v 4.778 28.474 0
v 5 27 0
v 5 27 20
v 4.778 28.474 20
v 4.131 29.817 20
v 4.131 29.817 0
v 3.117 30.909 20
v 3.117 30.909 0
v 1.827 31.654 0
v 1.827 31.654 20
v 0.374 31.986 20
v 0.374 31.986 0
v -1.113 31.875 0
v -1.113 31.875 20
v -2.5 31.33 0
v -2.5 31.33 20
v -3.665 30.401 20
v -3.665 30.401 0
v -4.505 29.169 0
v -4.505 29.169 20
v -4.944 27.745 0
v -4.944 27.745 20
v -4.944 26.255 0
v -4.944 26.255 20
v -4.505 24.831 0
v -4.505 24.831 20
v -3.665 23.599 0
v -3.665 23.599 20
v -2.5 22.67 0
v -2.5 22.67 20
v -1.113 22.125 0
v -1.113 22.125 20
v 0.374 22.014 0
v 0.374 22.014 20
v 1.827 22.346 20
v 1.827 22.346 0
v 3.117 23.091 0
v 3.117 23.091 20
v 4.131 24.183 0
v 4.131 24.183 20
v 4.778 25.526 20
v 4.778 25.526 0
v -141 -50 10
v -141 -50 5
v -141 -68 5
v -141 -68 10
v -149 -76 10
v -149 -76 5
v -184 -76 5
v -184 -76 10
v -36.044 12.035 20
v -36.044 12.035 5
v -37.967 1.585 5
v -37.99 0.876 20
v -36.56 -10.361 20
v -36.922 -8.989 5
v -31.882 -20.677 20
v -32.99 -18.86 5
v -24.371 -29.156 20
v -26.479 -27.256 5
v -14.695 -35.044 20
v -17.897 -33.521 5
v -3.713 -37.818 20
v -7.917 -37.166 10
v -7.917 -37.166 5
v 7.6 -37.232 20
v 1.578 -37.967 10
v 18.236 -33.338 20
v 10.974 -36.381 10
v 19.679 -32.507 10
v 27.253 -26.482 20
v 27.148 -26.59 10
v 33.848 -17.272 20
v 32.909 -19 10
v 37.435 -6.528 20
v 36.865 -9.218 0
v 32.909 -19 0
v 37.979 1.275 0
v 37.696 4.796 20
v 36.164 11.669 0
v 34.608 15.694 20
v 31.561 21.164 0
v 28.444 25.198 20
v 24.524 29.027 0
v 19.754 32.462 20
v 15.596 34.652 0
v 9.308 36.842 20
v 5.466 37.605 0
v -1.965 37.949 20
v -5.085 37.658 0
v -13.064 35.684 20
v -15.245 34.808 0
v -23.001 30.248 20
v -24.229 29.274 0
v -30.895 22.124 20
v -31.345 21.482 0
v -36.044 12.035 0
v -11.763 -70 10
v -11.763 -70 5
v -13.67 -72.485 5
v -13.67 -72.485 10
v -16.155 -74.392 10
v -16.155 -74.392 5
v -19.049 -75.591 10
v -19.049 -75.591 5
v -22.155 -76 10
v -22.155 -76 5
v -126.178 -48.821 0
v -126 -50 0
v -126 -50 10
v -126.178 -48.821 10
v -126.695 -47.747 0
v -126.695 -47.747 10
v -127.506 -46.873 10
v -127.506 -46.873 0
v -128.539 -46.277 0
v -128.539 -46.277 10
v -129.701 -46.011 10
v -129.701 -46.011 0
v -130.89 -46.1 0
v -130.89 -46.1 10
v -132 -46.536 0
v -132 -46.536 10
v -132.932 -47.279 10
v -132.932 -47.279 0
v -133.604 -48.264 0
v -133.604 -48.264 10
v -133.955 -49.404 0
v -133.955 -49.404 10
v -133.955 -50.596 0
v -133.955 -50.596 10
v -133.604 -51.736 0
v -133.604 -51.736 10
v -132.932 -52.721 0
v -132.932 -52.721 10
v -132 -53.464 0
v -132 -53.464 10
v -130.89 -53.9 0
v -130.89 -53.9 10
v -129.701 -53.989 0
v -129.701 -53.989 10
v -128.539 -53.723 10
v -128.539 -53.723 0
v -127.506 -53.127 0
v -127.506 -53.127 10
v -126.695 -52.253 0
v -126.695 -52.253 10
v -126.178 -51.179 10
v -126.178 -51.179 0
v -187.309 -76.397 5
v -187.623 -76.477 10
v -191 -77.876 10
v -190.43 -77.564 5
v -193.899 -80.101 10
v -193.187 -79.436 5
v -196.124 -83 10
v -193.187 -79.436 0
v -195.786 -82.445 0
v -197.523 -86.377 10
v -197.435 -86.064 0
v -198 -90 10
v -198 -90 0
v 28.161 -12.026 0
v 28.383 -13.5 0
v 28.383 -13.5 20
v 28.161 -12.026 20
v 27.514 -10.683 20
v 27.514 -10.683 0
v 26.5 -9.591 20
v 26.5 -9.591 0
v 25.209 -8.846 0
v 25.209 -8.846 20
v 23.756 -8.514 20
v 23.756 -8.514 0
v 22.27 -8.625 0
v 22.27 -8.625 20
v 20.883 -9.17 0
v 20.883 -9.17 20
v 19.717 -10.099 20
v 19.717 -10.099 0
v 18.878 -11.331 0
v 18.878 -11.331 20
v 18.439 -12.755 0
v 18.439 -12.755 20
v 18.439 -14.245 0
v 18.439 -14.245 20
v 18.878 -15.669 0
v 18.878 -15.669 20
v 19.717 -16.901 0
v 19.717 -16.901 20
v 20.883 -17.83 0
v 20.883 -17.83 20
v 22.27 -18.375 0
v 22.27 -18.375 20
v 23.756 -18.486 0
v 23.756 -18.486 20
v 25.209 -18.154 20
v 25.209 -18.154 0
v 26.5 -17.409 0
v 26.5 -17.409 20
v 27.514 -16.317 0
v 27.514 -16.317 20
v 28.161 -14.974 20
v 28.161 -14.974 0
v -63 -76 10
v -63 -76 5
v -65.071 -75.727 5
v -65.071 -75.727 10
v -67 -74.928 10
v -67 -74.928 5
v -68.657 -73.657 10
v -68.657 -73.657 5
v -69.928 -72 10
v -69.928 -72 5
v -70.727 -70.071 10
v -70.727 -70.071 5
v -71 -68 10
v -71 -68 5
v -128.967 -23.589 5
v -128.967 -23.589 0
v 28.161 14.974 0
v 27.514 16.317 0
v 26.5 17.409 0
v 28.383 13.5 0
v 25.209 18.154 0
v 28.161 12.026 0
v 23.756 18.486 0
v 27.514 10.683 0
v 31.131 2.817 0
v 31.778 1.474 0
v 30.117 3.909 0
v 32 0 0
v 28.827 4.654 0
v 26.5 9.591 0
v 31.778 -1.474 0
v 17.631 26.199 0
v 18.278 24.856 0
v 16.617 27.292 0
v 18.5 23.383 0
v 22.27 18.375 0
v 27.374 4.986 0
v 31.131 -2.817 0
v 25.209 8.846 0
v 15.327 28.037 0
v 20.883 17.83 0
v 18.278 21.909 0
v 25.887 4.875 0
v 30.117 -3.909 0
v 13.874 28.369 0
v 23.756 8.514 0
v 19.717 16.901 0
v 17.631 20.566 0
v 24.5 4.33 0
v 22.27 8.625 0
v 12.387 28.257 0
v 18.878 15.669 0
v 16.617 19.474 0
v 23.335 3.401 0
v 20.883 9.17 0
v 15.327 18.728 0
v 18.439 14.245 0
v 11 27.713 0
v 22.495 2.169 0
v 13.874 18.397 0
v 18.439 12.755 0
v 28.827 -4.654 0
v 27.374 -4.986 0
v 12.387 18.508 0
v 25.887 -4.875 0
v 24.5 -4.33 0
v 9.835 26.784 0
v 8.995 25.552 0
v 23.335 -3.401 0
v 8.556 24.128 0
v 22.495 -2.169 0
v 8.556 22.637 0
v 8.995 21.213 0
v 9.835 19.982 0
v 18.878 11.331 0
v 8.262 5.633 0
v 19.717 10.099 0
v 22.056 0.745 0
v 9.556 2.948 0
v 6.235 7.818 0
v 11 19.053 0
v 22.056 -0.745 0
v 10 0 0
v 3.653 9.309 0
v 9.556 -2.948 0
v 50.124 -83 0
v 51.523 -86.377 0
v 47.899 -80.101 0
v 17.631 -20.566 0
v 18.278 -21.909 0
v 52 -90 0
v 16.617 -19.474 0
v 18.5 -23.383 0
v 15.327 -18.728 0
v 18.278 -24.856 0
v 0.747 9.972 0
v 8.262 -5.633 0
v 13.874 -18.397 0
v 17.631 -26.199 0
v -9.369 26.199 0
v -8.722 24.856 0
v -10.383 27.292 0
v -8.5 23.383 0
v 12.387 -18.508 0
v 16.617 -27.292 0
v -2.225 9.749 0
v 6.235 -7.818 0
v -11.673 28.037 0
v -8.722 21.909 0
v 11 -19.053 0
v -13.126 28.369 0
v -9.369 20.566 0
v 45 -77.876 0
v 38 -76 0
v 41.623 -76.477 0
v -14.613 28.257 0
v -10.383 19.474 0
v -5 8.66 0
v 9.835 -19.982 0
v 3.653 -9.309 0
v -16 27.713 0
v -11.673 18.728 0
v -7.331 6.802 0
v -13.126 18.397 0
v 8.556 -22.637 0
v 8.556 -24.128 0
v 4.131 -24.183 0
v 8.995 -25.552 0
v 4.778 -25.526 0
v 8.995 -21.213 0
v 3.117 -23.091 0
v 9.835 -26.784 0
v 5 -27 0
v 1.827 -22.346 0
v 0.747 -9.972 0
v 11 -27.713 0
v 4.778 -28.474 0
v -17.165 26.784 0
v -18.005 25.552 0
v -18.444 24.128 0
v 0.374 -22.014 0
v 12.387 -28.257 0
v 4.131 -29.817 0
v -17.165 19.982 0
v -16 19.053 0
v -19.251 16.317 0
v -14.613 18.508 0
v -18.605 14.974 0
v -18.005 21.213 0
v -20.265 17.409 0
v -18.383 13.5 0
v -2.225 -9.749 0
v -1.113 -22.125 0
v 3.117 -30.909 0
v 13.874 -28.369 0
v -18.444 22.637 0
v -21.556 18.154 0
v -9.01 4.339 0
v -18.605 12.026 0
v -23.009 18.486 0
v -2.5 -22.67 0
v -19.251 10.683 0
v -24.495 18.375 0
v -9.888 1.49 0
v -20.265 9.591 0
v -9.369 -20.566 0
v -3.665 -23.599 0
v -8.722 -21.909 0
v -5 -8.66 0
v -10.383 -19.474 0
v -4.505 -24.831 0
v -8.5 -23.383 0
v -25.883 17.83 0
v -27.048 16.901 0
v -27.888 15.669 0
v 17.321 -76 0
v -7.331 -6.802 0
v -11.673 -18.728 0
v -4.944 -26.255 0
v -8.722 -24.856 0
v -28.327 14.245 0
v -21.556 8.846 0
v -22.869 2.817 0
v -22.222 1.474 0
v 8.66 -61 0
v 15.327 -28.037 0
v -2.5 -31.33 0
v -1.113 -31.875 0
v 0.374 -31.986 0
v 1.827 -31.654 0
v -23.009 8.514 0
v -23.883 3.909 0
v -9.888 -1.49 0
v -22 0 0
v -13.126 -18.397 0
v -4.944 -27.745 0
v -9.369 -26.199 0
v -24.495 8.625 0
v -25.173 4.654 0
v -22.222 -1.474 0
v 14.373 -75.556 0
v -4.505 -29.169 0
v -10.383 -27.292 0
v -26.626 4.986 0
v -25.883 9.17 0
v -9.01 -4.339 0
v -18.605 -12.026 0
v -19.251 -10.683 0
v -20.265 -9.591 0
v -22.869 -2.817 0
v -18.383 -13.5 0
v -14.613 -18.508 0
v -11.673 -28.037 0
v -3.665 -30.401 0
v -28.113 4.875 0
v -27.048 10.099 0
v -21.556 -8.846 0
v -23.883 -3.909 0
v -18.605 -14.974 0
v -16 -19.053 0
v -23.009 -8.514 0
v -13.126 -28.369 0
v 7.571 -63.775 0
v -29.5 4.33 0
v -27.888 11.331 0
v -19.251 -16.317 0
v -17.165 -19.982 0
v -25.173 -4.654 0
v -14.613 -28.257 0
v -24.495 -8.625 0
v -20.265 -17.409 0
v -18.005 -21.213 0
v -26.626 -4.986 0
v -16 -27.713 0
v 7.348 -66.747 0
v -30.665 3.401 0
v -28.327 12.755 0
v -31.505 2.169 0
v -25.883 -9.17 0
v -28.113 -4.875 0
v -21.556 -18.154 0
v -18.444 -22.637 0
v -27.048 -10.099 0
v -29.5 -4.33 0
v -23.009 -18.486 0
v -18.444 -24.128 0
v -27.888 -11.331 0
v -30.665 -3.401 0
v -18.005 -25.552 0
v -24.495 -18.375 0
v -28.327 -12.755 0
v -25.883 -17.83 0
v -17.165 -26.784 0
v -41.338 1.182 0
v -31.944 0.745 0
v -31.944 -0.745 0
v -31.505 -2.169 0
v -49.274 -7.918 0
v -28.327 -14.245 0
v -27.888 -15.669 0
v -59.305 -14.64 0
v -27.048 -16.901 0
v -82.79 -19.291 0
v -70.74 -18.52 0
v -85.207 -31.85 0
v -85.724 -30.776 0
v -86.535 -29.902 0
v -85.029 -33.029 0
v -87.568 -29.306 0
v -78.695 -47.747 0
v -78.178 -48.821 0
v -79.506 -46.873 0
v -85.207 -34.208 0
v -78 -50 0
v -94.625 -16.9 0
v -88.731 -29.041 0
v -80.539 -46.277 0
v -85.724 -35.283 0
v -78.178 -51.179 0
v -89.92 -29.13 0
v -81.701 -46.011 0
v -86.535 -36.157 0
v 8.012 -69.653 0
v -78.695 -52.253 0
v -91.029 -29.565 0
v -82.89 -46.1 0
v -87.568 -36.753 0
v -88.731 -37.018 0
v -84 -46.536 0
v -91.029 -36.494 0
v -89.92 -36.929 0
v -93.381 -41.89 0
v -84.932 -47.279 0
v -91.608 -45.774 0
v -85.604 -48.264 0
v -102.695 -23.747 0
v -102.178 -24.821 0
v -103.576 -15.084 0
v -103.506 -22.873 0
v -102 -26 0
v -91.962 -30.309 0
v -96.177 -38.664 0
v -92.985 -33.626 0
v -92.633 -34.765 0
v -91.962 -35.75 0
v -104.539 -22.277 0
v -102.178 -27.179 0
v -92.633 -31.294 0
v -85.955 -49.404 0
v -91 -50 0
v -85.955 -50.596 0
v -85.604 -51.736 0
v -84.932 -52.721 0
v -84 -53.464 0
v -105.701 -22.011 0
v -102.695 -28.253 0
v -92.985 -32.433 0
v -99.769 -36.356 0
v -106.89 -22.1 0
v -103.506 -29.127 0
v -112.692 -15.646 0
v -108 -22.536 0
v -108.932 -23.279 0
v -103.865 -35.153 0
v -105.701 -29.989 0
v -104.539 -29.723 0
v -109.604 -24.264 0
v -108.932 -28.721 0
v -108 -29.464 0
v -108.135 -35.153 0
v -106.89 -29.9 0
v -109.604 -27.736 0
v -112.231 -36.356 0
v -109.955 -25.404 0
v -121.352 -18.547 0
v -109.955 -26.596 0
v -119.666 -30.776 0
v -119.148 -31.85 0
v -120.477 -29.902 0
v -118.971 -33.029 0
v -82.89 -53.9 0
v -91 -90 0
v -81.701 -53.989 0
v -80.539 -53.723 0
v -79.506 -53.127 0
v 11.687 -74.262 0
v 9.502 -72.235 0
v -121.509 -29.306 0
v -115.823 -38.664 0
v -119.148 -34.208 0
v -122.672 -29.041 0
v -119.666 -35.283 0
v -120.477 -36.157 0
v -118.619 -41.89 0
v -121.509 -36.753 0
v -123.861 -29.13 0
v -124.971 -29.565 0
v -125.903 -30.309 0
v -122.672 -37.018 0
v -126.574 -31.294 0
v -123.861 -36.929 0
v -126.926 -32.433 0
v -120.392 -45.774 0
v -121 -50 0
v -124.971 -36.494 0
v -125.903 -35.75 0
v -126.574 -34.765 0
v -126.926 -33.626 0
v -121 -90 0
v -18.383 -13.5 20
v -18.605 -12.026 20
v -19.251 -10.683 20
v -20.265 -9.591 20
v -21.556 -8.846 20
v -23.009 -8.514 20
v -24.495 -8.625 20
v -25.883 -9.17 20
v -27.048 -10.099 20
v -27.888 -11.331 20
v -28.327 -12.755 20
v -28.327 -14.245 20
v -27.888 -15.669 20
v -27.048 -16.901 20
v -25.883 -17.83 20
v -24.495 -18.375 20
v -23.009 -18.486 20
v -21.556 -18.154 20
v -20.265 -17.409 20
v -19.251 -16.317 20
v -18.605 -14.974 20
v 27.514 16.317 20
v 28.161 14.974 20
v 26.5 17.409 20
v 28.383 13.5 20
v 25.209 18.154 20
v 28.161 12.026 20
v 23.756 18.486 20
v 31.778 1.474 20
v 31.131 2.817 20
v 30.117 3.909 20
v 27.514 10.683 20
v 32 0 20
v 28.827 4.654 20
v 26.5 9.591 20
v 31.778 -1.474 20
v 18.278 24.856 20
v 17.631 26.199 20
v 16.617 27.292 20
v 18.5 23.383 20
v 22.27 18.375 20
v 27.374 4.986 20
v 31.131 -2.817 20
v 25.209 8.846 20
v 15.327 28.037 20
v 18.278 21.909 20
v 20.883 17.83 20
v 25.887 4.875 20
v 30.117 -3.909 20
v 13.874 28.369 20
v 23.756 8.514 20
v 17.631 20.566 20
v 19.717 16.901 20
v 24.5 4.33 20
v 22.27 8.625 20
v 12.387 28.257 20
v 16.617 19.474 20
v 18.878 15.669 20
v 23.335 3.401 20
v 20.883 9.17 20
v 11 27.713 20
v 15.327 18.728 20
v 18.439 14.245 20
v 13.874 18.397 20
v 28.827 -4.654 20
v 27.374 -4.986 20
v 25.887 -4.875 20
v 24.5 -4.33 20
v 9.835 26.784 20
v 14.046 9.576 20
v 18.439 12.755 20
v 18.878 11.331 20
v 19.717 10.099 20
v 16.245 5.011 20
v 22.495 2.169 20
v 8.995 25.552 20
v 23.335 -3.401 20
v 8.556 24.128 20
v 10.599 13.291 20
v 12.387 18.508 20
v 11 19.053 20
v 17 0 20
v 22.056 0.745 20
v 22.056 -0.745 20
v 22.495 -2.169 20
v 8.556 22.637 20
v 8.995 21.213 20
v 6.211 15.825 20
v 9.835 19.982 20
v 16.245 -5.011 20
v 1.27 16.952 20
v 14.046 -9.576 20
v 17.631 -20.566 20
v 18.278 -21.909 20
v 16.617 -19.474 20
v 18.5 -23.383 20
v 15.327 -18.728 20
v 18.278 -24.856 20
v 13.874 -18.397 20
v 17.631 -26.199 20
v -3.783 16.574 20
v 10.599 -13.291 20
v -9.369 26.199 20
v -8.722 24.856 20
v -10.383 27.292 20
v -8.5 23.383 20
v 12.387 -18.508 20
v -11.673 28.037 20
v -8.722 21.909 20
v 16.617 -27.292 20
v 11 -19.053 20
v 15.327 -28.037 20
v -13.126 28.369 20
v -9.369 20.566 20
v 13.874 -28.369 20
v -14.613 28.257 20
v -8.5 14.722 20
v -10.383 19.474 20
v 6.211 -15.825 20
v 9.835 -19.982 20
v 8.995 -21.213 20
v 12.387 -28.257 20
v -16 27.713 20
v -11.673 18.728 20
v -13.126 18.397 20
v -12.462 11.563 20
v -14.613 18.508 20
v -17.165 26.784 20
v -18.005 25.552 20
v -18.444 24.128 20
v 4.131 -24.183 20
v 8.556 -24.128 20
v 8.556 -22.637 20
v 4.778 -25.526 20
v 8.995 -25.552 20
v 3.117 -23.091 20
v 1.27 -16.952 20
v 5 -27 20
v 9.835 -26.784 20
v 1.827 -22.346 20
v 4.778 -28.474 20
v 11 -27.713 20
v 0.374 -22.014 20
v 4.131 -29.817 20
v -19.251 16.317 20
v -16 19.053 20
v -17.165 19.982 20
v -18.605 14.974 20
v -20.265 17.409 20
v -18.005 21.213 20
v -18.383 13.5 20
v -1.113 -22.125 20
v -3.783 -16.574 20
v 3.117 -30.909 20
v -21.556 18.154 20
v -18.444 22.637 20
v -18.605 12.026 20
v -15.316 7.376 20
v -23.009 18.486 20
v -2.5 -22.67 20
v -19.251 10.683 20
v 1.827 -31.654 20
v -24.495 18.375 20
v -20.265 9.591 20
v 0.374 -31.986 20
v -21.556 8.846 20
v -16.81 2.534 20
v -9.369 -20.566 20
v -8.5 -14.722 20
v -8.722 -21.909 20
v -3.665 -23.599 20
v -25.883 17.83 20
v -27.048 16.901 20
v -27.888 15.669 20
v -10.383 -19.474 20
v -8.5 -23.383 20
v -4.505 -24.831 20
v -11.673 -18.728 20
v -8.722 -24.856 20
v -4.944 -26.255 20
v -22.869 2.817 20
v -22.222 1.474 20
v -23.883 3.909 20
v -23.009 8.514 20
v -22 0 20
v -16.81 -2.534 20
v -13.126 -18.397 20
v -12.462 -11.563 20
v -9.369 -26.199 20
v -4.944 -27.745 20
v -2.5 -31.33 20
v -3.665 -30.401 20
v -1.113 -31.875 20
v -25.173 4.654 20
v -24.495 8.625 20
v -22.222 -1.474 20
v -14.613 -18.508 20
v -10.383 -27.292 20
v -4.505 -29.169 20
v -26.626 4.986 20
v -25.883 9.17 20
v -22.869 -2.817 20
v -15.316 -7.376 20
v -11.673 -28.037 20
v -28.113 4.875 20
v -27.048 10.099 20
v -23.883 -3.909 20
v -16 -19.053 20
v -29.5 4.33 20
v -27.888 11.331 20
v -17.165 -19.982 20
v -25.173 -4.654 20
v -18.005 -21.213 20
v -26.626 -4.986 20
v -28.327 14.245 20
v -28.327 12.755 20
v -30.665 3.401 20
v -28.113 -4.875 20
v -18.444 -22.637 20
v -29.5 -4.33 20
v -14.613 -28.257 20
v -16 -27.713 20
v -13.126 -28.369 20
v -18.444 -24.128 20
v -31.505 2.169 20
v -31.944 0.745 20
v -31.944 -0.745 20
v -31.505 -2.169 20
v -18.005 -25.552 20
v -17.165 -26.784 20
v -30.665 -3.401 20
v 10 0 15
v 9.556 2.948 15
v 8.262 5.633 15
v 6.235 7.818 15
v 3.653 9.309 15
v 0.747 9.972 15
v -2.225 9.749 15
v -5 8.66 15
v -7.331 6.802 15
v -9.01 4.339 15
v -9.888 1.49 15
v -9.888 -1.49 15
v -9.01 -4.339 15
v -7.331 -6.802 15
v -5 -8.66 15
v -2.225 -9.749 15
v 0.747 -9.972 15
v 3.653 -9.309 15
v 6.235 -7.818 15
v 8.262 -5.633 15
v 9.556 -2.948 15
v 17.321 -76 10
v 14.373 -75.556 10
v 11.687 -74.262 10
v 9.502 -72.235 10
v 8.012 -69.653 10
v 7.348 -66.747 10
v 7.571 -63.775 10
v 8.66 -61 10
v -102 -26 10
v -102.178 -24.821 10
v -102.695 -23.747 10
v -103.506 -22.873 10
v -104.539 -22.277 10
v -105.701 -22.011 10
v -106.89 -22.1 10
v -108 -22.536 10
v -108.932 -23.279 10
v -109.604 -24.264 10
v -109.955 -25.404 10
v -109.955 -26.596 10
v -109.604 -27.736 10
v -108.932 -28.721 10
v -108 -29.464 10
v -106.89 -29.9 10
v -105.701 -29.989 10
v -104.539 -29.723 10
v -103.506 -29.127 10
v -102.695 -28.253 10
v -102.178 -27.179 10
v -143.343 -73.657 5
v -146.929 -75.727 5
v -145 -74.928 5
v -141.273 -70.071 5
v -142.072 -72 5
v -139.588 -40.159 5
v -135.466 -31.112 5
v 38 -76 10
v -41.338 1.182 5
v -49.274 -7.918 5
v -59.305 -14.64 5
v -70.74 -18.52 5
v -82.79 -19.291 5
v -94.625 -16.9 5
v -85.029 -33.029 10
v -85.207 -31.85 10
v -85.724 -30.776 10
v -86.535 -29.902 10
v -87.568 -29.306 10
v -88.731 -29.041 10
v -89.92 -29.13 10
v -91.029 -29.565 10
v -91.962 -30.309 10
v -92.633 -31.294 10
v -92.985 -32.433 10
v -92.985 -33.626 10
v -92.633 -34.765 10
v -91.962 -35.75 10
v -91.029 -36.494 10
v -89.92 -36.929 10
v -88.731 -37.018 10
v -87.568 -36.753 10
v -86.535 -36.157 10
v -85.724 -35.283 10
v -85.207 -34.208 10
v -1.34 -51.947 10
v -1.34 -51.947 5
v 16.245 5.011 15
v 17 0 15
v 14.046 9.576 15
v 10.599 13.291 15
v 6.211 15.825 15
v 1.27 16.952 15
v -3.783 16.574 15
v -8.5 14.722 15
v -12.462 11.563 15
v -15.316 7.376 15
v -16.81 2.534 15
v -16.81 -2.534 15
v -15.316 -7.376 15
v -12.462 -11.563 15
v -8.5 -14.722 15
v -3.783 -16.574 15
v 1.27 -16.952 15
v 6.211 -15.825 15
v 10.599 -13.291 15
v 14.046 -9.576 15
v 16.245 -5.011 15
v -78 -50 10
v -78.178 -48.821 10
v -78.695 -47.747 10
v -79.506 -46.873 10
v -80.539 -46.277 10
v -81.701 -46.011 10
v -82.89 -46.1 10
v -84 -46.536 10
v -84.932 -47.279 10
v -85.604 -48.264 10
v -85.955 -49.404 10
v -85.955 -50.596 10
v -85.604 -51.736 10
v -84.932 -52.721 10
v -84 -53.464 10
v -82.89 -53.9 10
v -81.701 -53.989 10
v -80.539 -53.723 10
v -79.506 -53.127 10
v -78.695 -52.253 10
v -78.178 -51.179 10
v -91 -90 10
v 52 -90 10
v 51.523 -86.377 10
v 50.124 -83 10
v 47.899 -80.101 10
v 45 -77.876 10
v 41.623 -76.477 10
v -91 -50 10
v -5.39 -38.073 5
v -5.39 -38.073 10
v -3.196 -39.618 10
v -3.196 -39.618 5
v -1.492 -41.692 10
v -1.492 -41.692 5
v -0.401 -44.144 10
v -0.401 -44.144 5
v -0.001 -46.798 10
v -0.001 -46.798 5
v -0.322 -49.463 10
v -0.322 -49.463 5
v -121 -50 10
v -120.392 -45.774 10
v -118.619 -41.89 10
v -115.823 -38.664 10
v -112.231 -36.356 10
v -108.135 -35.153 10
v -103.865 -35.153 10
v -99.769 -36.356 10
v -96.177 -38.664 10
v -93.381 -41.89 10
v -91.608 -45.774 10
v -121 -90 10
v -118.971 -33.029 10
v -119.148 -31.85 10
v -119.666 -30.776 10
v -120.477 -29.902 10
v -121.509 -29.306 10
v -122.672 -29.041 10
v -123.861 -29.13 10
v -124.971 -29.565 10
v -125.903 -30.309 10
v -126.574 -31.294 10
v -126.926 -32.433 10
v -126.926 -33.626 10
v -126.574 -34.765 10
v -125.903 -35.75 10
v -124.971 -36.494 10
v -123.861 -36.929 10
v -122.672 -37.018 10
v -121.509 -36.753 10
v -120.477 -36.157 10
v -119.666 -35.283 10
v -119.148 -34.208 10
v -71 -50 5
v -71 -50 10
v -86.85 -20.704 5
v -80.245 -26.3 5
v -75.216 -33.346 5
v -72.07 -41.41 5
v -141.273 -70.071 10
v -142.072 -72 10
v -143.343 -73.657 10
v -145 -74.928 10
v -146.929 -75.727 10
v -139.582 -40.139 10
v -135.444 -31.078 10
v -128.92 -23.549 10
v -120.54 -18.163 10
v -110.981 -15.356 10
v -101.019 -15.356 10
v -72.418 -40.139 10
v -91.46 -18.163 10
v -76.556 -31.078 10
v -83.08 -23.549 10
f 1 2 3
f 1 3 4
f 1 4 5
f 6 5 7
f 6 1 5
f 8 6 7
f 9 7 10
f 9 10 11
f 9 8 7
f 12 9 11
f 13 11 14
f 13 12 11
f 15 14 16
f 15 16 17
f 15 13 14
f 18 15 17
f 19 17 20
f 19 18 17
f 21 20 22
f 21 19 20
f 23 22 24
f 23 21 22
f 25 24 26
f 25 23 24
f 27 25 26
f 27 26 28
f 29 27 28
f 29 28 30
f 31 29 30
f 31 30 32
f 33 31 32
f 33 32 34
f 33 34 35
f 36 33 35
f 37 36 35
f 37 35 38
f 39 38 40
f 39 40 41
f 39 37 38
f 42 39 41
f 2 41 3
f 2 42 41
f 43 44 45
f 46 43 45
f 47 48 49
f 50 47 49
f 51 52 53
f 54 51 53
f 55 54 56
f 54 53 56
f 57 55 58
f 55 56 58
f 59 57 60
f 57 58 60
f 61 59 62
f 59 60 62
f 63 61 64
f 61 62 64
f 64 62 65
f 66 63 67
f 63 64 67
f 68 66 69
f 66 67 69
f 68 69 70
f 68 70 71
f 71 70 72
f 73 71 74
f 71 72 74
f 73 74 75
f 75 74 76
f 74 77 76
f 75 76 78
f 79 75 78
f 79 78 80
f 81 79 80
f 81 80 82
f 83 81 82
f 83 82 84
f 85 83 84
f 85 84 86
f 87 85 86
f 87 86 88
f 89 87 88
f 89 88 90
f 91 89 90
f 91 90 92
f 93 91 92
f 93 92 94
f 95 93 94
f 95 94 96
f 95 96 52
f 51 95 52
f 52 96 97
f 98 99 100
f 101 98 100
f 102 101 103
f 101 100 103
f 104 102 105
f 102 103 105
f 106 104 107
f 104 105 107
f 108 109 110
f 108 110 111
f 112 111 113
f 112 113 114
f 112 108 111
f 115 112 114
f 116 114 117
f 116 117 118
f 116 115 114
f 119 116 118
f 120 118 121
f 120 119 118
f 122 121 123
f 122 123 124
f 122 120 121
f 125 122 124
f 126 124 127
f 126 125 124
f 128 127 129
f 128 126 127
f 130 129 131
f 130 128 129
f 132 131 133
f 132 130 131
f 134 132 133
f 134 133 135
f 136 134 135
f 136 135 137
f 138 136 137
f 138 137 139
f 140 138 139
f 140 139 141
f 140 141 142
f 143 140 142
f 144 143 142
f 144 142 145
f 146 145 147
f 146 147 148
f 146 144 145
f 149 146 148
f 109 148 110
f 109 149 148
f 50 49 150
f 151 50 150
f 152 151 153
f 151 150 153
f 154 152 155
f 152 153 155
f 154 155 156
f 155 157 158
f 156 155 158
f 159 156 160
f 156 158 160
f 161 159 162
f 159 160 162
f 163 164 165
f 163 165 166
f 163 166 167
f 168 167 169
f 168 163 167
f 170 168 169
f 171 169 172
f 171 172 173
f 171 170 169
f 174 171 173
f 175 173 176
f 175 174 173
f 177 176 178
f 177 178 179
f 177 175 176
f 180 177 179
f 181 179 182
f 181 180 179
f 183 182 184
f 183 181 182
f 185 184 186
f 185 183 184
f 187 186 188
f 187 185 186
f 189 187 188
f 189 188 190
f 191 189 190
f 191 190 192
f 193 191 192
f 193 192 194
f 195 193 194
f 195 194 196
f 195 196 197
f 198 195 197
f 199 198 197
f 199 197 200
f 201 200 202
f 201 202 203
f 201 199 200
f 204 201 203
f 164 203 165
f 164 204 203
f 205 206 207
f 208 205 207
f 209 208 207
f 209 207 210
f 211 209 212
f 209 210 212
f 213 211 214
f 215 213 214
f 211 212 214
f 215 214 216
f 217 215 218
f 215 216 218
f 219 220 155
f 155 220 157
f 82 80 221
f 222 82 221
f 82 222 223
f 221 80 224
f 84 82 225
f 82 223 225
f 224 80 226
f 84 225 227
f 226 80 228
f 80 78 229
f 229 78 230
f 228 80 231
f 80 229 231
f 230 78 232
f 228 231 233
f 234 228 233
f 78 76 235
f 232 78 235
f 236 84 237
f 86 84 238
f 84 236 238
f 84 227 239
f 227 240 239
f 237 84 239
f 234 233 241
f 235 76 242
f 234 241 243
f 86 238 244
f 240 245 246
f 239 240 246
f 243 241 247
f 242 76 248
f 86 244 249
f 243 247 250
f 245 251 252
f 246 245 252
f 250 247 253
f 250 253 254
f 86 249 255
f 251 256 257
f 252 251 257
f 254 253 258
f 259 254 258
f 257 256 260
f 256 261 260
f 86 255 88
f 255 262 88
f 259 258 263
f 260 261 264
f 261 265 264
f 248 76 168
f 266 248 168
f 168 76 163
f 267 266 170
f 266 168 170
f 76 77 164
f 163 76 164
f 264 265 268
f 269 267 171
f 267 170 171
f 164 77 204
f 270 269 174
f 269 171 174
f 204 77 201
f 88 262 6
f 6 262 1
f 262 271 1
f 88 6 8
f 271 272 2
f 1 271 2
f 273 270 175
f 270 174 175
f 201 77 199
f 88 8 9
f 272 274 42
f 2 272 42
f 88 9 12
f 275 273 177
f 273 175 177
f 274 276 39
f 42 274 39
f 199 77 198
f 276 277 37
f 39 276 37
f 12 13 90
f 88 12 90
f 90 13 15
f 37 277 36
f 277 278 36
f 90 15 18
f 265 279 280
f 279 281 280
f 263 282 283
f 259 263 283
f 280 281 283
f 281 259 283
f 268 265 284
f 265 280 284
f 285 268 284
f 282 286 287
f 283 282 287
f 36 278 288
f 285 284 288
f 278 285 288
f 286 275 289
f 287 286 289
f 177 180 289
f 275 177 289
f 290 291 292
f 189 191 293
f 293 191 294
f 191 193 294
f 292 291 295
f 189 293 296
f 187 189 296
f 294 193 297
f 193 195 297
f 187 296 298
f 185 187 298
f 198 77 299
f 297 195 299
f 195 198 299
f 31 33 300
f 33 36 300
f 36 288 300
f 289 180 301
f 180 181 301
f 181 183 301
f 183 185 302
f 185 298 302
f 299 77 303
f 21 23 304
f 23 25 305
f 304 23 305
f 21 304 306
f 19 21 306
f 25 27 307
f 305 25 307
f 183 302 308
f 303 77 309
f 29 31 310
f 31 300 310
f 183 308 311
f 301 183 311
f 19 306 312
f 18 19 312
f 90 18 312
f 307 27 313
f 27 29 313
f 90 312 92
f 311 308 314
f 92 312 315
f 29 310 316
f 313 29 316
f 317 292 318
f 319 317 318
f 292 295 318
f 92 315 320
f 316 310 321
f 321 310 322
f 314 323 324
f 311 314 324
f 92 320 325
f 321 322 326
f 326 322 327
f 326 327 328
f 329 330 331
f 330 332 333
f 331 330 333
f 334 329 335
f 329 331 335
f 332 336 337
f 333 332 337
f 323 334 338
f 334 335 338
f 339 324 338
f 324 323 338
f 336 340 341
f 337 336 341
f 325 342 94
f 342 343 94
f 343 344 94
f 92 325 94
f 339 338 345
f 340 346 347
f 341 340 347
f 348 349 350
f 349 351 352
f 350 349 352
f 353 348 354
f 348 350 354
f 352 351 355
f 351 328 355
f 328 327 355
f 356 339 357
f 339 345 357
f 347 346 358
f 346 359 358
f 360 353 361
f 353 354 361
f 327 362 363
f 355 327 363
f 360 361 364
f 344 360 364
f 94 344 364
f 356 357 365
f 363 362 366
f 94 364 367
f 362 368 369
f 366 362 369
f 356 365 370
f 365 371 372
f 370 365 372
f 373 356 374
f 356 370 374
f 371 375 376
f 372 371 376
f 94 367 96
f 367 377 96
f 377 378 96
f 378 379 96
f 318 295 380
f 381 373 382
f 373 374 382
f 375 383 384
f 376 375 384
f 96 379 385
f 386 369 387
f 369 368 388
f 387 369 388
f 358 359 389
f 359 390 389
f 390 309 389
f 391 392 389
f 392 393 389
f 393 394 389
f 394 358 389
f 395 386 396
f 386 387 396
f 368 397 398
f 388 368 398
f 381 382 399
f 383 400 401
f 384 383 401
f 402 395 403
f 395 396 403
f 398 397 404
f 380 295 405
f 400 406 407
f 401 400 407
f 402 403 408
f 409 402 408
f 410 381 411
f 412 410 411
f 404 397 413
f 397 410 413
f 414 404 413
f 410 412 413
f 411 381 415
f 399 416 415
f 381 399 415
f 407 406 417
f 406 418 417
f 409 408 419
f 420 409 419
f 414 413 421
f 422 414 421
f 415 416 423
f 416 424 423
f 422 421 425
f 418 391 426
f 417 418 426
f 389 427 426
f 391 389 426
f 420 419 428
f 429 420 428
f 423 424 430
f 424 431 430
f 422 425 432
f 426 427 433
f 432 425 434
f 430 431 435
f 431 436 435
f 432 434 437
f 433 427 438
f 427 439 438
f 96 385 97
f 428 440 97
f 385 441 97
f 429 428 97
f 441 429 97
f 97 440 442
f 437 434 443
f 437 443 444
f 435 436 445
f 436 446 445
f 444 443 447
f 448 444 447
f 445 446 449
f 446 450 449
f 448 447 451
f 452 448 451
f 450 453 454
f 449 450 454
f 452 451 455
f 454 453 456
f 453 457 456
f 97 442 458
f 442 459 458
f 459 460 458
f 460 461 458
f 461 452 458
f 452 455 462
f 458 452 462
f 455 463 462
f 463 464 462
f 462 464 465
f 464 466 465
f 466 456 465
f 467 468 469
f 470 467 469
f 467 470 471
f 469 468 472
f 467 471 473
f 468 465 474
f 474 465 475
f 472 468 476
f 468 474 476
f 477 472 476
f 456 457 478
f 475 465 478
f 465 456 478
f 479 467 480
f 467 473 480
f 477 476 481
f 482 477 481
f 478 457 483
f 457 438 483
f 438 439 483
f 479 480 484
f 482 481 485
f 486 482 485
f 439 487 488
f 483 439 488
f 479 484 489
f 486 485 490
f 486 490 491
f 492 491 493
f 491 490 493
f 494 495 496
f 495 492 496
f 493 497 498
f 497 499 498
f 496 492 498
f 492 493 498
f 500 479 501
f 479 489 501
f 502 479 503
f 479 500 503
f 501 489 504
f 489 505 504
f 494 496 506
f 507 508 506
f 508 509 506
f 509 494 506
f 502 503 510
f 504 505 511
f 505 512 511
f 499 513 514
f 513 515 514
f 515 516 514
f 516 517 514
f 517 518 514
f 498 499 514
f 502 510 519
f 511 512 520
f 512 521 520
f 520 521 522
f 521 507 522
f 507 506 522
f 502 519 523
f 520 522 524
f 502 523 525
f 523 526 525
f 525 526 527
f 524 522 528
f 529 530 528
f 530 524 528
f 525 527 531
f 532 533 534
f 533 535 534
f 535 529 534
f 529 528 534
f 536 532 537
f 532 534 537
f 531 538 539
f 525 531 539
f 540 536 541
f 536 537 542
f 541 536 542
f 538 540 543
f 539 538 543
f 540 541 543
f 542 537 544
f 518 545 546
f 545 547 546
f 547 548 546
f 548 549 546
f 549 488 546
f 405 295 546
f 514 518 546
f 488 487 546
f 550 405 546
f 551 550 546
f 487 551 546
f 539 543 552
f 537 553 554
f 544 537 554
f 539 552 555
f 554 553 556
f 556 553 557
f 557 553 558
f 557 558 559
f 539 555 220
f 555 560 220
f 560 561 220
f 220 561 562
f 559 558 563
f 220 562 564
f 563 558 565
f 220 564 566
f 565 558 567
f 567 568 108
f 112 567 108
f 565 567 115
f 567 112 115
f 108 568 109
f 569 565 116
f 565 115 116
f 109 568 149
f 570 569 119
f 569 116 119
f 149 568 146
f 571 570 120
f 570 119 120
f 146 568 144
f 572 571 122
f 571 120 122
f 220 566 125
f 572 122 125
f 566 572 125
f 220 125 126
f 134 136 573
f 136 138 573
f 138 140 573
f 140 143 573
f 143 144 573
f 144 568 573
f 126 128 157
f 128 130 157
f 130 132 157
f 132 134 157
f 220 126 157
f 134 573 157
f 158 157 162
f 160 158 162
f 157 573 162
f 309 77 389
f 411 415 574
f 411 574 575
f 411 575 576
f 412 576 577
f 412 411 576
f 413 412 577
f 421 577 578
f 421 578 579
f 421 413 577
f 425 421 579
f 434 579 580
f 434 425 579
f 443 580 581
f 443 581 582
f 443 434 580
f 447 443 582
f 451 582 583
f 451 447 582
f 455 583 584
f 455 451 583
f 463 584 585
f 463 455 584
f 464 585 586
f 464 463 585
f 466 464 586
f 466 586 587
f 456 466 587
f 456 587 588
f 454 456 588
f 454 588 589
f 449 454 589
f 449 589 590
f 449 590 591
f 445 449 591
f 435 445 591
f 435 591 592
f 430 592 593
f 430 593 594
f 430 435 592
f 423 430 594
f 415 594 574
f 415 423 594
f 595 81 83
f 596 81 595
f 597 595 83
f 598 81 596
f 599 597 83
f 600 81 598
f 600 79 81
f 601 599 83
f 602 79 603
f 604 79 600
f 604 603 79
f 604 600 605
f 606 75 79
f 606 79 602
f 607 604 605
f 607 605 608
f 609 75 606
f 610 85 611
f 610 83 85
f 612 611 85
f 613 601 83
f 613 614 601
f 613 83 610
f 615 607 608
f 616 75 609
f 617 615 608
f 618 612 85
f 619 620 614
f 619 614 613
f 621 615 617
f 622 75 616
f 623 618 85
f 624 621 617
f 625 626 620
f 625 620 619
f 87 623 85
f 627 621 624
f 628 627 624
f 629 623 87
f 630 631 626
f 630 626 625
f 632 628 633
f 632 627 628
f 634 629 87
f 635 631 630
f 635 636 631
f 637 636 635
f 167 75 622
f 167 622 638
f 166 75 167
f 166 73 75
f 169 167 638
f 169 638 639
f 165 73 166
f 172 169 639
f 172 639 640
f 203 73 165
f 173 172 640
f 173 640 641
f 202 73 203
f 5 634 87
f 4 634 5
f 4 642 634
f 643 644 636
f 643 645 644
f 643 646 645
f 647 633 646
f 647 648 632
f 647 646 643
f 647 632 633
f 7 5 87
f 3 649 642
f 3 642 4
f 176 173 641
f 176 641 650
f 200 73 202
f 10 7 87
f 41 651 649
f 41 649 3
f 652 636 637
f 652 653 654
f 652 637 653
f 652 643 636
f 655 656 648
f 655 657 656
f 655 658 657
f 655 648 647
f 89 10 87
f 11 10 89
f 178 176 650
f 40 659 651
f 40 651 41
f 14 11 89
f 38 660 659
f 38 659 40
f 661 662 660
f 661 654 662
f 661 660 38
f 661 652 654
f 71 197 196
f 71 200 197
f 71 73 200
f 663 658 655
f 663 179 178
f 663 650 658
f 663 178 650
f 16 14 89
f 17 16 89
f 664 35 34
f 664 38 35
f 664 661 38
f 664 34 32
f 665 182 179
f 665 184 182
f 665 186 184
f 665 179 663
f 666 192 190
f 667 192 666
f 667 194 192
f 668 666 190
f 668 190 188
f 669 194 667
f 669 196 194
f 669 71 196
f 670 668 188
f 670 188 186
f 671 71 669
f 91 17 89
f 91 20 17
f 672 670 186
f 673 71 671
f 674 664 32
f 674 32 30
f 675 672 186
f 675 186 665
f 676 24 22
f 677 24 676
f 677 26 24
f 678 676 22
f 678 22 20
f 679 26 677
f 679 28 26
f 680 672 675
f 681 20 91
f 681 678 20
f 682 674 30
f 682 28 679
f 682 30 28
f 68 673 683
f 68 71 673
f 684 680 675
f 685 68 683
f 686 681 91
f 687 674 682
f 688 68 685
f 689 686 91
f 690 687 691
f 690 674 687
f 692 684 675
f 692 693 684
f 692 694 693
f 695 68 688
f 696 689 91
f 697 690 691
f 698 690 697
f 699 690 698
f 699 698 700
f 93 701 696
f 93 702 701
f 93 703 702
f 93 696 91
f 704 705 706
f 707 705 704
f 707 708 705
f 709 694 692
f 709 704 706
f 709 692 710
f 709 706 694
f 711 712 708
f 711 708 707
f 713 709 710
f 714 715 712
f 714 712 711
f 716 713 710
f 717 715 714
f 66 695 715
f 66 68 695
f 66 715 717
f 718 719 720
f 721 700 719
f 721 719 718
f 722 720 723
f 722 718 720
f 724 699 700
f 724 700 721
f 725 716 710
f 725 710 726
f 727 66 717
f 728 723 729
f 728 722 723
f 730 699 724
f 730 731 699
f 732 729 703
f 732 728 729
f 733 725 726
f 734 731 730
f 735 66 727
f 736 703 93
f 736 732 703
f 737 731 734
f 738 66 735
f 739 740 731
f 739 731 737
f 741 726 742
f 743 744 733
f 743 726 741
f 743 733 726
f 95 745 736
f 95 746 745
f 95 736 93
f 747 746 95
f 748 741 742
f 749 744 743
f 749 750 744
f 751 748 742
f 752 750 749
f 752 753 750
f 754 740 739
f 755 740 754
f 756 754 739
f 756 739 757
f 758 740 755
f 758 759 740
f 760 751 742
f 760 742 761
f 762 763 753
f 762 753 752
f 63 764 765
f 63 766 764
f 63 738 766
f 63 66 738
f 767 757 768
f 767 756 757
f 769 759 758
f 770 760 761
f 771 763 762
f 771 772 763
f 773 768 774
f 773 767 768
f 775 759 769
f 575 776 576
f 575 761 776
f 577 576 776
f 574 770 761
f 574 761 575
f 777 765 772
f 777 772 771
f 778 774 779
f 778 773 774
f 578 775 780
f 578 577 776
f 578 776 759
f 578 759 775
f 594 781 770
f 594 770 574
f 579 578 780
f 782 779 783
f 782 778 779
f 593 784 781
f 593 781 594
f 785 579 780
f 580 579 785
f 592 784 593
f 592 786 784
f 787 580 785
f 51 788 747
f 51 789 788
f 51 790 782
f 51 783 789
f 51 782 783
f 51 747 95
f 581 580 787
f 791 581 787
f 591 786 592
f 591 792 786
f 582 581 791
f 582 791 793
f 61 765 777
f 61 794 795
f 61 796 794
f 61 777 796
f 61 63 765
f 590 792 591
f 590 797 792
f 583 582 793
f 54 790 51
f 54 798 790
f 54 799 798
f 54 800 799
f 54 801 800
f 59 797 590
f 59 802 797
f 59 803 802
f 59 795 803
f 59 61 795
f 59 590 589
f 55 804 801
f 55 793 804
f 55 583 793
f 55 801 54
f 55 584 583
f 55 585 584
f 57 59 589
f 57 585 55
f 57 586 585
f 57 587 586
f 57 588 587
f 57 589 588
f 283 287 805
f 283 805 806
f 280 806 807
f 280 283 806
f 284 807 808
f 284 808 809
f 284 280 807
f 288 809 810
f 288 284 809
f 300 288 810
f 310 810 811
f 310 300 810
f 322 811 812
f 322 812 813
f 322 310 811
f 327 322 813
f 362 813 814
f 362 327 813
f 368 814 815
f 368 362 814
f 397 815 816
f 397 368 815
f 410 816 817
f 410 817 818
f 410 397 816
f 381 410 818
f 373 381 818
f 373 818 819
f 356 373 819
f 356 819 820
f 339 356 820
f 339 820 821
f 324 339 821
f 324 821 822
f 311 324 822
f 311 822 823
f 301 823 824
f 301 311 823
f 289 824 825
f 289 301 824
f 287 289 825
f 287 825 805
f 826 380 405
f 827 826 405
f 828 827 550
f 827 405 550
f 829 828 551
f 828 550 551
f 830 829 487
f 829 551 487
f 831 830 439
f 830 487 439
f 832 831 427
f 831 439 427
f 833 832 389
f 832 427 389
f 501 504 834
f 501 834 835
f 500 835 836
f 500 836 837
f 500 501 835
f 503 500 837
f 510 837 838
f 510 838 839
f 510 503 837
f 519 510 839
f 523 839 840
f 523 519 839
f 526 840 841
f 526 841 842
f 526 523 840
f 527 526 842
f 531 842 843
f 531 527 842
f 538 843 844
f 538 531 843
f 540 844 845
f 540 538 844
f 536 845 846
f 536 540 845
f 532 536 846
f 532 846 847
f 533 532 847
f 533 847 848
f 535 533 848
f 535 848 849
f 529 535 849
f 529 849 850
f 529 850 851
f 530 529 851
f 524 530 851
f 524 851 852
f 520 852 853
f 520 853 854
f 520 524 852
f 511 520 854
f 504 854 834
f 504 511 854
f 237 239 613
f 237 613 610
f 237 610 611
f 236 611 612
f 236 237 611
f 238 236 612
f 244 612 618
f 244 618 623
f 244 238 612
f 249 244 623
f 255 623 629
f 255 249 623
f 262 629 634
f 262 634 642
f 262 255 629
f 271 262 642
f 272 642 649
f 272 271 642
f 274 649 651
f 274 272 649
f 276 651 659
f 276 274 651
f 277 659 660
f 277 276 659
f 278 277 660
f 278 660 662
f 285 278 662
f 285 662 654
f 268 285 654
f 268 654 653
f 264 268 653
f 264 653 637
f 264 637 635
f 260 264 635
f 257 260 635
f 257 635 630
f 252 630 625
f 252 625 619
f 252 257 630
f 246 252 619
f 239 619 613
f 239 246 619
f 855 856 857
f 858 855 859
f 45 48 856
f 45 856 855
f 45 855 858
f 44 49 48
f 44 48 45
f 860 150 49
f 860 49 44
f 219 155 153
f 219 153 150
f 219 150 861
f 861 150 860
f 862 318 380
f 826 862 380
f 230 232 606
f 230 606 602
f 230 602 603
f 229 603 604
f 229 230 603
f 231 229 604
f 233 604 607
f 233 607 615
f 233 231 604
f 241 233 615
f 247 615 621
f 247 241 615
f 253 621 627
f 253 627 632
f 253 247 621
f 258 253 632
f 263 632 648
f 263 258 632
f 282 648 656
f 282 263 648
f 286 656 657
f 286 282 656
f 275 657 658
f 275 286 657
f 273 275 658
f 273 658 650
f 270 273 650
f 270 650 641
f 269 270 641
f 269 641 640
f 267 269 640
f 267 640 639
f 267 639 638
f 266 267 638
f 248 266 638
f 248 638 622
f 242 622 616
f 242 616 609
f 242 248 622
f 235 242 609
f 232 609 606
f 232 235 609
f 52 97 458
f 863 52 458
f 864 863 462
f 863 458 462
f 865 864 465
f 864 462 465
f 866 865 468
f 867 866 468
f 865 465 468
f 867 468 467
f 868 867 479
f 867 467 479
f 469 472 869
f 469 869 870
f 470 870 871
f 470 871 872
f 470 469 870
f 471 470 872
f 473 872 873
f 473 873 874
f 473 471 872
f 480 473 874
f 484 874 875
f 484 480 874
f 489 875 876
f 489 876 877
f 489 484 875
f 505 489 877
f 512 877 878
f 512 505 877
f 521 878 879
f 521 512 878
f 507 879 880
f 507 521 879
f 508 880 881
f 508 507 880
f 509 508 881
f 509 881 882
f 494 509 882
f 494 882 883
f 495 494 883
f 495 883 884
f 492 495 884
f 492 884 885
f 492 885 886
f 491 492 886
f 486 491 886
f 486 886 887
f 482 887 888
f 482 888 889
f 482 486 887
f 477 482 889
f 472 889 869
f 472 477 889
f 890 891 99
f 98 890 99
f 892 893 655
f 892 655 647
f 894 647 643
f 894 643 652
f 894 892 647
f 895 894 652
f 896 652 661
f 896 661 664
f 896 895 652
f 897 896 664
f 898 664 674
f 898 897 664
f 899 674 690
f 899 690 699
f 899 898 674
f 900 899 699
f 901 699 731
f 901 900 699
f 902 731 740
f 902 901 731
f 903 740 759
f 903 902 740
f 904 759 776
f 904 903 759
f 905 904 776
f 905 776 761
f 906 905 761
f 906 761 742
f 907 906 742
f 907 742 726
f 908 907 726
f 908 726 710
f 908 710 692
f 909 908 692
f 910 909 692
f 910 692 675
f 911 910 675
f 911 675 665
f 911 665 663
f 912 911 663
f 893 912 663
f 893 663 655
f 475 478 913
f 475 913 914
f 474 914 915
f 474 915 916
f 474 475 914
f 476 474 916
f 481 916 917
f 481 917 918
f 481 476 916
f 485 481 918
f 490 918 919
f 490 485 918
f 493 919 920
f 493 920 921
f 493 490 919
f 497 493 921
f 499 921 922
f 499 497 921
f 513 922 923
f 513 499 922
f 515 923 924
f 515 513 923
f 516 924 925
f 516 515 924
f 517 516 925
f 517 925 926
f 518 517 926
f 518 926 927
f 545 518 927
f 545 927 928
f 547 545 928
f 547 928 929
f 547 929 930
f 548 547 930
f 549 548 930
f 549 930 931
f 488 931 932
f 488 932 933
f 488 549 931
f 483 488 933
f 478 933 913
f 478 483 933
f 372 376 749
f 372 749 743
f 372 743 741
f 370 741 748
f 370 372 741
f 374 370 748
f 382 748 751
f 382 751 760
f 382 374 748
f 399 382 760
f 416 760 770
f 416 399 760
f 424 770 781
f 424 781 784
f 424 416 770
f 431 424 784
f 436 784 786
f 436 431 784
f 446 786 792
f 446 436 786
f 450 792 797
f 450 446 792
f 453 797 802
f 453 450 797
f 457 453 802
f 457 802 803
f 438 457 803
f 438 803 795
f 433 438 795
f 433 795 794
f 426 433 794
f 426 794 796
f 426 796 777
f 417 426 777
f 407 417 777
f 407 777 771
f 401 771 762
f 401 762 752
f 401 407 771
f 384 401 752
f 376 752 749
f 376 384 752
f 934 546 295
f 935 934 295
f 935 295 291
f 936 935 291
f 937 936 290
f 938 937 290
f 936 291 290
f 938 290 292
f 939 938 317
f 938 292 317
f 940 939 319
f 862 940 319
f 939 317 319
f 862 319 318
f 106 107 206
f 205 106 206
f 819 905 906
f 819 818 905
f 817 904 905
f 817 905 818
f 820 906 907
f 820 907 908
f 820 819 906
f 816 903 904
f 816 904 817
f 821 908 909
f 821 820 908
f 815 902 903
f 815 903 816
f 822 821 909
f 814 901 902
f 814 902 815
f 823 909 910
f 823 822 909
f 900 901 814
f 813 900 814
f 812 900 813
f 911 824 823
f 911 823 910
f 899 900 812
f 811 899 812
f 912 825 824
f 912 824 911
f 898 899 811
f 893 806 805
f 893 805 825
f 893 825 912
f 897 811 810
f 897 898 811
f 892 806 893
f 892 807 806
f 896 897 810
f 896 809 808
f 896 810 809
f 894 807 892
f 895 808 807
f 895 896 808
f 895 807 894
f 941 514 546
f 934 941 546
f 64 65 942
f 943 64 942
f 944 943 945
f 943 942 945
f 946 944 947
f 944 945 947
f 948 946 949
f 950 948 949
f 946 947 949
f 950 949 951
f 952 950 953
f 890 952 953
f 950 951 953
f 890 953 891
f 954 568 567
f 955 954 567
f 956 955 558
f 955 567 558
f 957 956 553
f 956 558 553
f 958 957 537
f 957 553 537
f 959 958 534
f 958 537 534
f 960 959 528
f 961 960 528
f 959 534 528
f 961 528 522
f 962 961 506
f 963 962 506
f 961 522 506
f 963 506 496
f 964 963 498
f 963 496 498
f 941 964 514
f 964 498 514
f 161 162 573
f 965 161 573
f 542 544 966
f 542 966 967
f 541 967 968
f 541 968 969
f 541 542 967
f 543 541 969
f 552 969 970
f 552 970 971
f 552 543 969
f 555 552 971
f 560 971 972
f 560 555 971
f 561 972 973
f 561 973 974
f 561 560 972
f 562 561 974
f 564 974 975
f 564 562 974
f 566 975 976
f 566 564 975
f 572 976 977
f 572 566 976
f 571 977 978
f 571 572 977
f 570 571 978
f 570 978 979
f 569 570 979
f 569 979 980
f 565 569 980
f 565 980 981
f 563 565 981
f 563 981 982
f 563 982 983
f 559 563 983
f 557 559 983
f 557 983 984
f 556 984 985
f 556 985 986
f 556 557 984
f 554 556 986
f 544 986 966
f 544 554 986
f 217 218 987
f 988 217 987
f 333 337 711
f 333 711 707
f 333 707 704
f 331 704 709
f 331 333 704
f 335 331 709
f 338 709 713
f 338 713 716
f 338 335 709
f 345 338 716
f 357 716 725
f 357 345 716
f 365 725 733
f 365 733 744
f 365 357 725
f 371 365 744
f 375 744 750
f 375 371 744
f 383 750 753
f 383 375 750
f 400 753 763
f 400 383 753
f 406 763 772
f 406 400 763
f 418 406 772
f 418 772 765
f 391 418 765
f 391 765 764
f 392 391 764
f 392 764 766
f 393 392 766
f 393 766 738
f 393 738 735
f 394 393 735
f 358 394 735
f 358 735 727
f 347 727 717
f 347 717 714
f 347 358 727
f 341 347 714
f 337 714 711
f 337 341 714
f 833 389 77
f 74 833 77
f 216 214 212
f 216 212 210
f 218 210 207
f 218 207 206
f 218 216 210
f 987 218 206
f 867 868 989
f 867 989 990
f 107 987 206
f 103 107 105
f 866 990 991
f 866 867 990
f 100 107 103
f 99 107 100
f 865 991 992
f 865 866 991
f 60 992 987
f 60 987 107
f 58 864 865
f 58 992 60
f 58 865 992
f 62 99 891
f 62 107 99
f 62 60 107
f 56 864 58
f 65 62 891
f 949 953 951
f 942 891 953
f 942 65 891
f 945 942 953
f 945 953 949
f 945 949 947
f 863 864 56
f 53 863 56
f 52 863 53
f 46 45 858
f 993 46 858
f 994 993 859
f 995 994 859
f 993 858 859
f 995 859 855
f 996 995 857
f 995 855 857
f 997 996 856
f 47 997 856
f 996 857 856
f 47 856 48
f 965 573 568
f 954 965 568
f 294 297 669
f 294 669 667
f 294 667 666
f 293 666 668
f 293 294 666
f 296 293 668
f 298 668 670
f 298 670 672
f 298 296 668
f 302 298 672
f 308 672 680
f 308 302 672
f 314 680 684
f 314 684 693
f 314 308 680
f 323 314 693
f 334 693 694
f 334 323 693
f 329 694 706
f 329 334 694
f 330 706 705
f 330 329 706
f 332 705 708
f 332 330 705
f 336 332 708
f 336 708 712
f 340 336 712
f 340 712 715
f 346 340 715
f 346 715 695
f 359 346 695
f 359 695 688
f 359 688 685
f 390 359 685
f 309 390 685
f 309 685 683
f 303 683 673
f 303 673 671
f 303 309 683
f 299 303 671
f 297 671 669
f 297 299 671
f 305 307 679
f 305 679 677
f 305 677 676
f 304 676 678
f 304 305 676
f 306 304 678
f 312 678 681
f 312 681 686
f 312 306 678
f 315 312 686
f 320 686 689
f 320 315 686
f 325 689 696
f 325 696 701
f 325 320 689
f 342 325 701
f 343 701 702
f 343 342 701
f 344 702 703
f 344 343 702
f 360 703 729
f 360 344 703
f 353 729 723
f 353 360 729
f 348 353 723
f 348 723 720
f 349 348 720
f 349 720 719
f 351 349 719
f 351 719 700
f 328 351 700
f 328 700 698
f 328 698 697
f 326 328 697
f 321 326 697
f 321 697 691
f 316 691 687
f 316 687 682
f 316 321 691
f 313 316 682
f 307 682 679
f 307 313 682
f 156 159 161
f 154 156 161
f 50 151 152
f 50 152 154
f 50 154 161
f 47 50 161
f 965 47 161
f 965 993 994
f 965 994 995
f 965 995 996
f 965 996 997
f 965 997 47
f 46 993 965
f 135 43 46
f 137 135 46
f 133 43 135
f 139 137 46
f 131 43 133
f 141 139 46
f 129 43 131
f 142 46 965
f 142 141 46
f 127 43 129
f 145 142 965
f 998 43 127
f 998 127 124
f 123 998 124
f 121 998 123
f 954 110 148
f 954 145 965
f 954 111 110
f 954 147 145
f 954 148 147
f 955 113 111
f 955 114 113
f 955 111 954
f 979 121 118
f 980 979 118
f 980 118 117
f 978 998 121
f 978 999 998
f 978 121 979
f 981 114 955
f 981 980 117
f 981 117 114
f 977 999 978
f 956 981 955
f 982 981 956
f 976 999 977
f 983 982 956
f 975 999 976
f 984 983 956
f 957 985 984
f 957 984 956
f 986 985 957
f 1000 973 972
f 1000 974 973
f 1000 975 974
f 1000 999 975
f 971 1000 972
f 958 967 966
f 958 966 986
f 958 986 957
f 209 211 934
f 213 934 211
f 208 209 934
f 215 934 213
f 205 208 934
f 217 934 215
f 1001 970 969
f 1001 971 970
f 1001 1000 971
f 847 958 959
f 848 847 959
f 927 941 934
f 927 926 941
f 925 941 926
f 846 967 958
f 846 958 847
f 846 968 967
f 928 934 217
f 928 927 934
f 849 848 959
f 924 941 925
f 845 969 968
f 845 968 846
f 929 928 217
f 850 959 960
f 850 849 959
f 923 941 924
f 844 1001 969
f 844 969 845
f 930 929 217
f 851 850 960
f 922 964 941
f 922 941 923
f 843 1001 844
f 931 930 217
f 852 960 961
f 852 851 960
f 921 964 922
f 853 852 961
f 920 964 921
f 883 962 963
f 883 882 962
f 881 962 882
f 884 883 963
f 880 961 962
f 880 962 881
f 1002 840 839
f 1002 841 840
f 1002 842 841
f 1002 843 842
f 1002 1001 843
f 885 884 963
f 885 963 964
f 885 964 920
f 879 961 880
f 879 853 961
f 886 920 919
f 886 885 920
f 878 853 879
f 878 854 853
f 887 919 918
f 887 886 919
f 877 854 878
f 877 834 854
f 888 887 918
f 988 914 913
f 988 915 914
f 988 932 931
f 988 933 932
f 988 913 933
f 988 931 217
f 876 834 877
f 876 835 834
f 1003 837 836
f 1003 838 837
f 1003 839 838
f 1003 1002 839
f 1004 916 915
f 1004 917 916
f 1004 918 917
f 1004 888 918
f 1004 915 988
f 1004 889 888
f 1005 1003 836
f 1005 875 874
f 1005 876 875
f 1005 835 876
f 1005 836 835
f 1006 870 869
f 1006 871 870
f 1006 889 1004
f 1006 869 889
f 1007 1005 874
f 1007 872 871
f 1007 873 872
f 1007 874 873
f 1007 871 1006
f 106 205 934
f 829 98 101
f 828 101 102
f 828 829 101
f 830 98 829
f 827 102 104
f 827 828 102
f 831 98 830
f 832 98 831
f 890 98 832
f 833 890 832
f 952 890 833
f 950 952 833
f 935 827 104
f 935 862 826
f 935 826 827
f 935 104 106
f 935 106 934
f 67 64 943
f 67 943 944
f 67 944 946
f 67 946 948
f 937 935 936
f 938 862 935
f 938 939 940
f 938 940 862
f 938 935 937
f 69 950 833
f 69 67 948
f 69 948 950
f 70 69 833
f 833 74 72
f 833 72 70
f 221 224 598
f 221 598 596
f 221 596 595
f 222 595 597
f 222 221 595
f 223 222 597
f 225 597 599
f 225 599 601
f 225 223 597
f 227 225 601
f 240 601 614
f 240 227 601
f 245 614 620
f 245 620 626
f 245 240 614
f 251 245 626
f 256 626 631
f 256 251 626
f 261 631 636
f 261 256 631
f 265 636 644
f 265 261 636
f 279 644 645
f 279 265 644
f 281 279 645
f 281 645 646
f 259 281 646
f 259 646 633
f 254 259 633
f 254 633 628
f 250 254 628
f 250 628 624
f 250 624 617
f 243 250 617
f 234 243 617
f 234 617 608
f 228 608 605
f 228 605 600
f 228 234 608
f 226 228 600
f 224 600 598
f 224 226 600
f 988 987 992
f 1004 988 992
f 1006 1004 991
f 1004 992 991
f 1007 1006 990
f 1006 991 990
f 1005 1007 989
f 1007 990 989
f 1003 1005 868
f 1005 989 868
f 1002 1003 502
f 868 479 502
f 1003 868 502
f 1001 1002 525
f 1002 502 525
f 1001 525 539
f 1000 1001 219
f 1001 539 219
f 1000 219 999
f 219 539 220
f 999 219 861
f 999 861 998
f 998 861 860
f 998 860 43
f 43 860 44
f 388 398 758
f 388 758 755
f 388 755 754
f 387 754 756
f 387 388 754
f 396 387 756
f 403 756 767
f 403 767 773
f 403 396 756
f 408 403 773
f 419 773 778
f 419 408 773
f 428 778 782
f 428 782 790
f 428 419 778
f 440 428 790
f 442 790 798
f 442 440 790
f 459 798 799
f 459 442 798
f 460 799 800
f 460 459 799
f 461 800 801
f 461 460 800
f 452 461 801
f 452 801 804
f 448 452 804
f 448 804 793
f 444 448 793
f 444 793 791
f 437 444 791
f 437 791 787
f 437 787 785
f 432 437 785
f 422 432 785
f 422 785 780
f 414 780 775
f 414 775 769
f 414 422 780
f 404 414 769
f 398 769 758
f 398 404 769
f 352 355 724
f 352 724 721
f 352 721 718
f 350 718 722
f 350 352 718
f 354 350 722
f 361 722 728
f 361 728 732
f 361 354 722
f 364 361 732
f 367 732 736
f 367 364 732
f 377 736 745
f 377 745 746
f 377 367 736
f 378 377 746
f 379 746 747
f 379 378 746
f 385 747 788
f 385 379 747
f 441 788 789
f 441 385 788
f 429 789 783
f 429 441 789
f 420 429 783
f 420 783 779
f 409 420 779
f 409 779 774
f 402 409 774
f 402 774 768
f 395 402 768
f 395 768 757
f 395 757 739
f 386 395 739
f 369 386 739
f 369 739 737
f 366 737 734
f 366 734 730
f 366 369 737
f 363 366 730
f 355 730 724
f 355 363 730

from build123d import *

# Parameters (mm, degrees)
SKETCH_1_R      = 4
EXTRUDE_1_DEPTH = 10
EXTRUDE_2_DEPTH = 5
SKETCH_1_4_R    = 17
SKETCH_1_4_R_2  = 10
EXTRUDE_3_DEPTH = 15
SKETCH_1_5_R    = 38
SKETCH_1_5_R_2  = 5
SKETCH_1_5_R_3  = 17
EXTRUDE_4_DEPTH = 20


with BuildPart() as part:
    # Эскиз1 → Бобышка-Вытянуть1 (new body)
    with BuildSketch(Plane.XY):
        with BuildLine():
            Line((-198, -90), (-121, -90))
            Line((-121, -90), (-121, -50))
            ThreePointArc((-121, -50), (-106, -35), (-91, -50))
            Line((-91, -50), (-91, -90))
            Line((-91, -90), (52, -90))
            ThreePointArc((52, -90), (47.899494937, -80.100505063), (38, -76))
            Line((38, -76), (17.320508076, -76))
            ThreePointArc((17.320508076, -76), (8.660254038, -71), (8.660254038, -61))
            Line((8.660254038, -61), (32.908965344, -19))
            ThreePointArc((32.908965344, -19), (15.44850963, -34.718057984), (-7.916666667, -37.166199549))
            ThreePointArc((-7.916666667, -37.166199549), (-0.863668952, -42.881381106), (-1.339745962, -51.946778377))
            Line((-1.339745962, -51.946778377), (-11.762778326, -70))
            ThreePointArc((-11.762778326, -70), (-16.155083171, -74.392304845), (-22.155083171, -76))
            Line((-22.155083171, -76), (-63, -76))
            ThreePointArc((-63, -76), (-68.656854249, -73.656854249), (-71, -68))
            Line((-71, -68), (-71, -50))
            ThreePointArc((-71, -50), (-106, -15), (-141, -50))
            Line((-141, -50), (-141, -68))
            ThreePointArc((-141, -68), (-143.343145751, -73.656854249), (-149, -76))
            Line((-149, -76), (-184, -76))
            ThreePointArc((-184, -76), (-193.899494937, -80.100505063), (-198, -90))
        make_face()
        with Locations((-130, -50)):
            Circle(SKETCH_1_R, mode=Mode.SUBTRACT)
        with Locations((-82, -50)):
            Circle(SKETCH_1_R, mode=Mode.SUBTRACT)
        with Locations((-122.970562748, -33.029437252)):
            Circle(SKETCH_1_R, mode=Mode.SUBTRACT)
        with Locations((-89.029437252, -33.029437252)):
            Circle(SKETCH_1_R, mode=Mode.SUBTRACT)
        with Locations((-106, -26)):
            Circle(SKETCH_1_R, mode=Mode.SUBTRACT)
    extrude(amount=EXTRUDE_1_DEPTH)

    # Эскиз1<3> → Бобышка-Вытянуть2 (add)
    with BuildSketch(Plane.XY):
        with BuildLine():
            Line((-128.966962921, -23.589422305), (-193.186785168, -79.435768922))
            ThreePointArc((-193.186785168, -79.435768922), (-188.904118927, -76.887043905), (-184, -76))
            Line((-184, -76), (-149, -76))
            ThreePointArc((-149, -76), (-143.343145751, -73.656854249), (-141, -68))
            Line((-141, -68), (-141, -50))
            ThreePointArc((-141, -50), (-137.849989813, -35.488688933), (-128.966962921, -23.589422305))
        make_face()
        with BuildLine():
            ThreePointArc((-36.043919772, 12.034776584), (-59.305035094, -14.640262917), (-94.625446436, -16.899856024))
            ThreePointArc((-94.625446436, -16.899856024), (-77.512201079, -29.666645318), (-71, -50))
            Line((-71, -50), (-71, -68))
            ThreePointArc((-71, -68), (-68.656854249, -73.656854249), (-63, -76))
            Line((-63, -76), (-22.155083171, -76))
            ThreePointArc((-22.155083171, -76), (-16.155083171, -74.392304845), (-11.762778326, -70))
            Line((-11.762778326, -70), (-1.339745962, -51.946778377))
            ThreePointArc((-1.339745962, -51.946778377), (-0.863668952, -42.881381106), (-7.916666667, -37.166199549))
            ThreePointArc((-7.916666667, -37.166199549), (-32.989654486, -18.859551874), (-36.043919772, 12.034776584))
        make_face()
    extrude(amount=EXTRUDE_2_DEPTH)



with BuildPart() as body_2:
    # Эскиз1<4> → Бобышка-Вытянуть3 (new body)
    with BuildSketch(Plane.XY):
        Circle(SKETCH_1_4_R)
        Circle(SKETCH_1_4_R_2, mode=Mode.SUBTRACT)
    extrude(amount=EXTRUDE_3_DEPTH)


with BuildPart() as part_1:
    add(part.part)

    add(body_2.part)  # Бобышка-Вытянуть4 merges body 2
    # Эскиз1<5> → Бобышка-Вытянуть4 (add)
    with BuildSketch(Plane.XY):
        with Locations(Location((0, 0, 0), (0, 0, 161.536247512))):
            Circle(SKETCH_1_5_R)
        with Locations((-13.5, 23.382685902)):
            Circle(SKETCH_1_5_R_2, mode=Mode.SUBTRACT)
        with Locations((-23.382685902, 13.5)):
            Circle(SKETCH_1_5_R_2, mode=Mode.SUBTRACT)
        with Locations((-27, 0)):
            Circle(SKETCH_1_5_R_2, mode=Mode.SUBTRACT)
        with Locations((-23.382685902, -13.5)):
            Circle(SKETCH_1_5_R_2, mode=Mode.SUBTRACT)
        with Locations((-13.5, -23.382685902)):
            Circle(SKETCH_1_5_R_2, mode=Mode.SUBTRACT)
        with Locations((0, -27)):
            Circle(SKETCH_1_5_R_2, mode=Mode.SUBTRACT)
        with Locations((13.5, -23.382685902)):
            Circle(SKETCH_1_5_R_2, mode=Mode.SUBTRACT)
        with Locations((23.382685902, -13.5)):
            Circle(SKETCH_1_5_R_2, mode=Mode.SUBTRACT)
        with Locations((27, 0)):
            Circle(SKETCH_1_5_R_2, mode=Mode.SUBTRACT)
        with Locations((23.382685902, 13.5)):
            Circle(SKETCH_1_5_R_2, mode=Mode.SUBTRACT)
        with Locations((13.5, 23.382685902)):
            Circle(SKETCH_1_5_R_2, mode=Mode.SUBTRACT)
        with Locations((0, 27)):
            Circle(SKETCH_1_5_R_2, mode=Mode.SUBTRACT)
        Circle(SKETCH_1_5_R_3, mode=Mode.SUBTRACT)
    extrude(amount=EXTRUDE_4_DEPTH)


solid = part_1.part
